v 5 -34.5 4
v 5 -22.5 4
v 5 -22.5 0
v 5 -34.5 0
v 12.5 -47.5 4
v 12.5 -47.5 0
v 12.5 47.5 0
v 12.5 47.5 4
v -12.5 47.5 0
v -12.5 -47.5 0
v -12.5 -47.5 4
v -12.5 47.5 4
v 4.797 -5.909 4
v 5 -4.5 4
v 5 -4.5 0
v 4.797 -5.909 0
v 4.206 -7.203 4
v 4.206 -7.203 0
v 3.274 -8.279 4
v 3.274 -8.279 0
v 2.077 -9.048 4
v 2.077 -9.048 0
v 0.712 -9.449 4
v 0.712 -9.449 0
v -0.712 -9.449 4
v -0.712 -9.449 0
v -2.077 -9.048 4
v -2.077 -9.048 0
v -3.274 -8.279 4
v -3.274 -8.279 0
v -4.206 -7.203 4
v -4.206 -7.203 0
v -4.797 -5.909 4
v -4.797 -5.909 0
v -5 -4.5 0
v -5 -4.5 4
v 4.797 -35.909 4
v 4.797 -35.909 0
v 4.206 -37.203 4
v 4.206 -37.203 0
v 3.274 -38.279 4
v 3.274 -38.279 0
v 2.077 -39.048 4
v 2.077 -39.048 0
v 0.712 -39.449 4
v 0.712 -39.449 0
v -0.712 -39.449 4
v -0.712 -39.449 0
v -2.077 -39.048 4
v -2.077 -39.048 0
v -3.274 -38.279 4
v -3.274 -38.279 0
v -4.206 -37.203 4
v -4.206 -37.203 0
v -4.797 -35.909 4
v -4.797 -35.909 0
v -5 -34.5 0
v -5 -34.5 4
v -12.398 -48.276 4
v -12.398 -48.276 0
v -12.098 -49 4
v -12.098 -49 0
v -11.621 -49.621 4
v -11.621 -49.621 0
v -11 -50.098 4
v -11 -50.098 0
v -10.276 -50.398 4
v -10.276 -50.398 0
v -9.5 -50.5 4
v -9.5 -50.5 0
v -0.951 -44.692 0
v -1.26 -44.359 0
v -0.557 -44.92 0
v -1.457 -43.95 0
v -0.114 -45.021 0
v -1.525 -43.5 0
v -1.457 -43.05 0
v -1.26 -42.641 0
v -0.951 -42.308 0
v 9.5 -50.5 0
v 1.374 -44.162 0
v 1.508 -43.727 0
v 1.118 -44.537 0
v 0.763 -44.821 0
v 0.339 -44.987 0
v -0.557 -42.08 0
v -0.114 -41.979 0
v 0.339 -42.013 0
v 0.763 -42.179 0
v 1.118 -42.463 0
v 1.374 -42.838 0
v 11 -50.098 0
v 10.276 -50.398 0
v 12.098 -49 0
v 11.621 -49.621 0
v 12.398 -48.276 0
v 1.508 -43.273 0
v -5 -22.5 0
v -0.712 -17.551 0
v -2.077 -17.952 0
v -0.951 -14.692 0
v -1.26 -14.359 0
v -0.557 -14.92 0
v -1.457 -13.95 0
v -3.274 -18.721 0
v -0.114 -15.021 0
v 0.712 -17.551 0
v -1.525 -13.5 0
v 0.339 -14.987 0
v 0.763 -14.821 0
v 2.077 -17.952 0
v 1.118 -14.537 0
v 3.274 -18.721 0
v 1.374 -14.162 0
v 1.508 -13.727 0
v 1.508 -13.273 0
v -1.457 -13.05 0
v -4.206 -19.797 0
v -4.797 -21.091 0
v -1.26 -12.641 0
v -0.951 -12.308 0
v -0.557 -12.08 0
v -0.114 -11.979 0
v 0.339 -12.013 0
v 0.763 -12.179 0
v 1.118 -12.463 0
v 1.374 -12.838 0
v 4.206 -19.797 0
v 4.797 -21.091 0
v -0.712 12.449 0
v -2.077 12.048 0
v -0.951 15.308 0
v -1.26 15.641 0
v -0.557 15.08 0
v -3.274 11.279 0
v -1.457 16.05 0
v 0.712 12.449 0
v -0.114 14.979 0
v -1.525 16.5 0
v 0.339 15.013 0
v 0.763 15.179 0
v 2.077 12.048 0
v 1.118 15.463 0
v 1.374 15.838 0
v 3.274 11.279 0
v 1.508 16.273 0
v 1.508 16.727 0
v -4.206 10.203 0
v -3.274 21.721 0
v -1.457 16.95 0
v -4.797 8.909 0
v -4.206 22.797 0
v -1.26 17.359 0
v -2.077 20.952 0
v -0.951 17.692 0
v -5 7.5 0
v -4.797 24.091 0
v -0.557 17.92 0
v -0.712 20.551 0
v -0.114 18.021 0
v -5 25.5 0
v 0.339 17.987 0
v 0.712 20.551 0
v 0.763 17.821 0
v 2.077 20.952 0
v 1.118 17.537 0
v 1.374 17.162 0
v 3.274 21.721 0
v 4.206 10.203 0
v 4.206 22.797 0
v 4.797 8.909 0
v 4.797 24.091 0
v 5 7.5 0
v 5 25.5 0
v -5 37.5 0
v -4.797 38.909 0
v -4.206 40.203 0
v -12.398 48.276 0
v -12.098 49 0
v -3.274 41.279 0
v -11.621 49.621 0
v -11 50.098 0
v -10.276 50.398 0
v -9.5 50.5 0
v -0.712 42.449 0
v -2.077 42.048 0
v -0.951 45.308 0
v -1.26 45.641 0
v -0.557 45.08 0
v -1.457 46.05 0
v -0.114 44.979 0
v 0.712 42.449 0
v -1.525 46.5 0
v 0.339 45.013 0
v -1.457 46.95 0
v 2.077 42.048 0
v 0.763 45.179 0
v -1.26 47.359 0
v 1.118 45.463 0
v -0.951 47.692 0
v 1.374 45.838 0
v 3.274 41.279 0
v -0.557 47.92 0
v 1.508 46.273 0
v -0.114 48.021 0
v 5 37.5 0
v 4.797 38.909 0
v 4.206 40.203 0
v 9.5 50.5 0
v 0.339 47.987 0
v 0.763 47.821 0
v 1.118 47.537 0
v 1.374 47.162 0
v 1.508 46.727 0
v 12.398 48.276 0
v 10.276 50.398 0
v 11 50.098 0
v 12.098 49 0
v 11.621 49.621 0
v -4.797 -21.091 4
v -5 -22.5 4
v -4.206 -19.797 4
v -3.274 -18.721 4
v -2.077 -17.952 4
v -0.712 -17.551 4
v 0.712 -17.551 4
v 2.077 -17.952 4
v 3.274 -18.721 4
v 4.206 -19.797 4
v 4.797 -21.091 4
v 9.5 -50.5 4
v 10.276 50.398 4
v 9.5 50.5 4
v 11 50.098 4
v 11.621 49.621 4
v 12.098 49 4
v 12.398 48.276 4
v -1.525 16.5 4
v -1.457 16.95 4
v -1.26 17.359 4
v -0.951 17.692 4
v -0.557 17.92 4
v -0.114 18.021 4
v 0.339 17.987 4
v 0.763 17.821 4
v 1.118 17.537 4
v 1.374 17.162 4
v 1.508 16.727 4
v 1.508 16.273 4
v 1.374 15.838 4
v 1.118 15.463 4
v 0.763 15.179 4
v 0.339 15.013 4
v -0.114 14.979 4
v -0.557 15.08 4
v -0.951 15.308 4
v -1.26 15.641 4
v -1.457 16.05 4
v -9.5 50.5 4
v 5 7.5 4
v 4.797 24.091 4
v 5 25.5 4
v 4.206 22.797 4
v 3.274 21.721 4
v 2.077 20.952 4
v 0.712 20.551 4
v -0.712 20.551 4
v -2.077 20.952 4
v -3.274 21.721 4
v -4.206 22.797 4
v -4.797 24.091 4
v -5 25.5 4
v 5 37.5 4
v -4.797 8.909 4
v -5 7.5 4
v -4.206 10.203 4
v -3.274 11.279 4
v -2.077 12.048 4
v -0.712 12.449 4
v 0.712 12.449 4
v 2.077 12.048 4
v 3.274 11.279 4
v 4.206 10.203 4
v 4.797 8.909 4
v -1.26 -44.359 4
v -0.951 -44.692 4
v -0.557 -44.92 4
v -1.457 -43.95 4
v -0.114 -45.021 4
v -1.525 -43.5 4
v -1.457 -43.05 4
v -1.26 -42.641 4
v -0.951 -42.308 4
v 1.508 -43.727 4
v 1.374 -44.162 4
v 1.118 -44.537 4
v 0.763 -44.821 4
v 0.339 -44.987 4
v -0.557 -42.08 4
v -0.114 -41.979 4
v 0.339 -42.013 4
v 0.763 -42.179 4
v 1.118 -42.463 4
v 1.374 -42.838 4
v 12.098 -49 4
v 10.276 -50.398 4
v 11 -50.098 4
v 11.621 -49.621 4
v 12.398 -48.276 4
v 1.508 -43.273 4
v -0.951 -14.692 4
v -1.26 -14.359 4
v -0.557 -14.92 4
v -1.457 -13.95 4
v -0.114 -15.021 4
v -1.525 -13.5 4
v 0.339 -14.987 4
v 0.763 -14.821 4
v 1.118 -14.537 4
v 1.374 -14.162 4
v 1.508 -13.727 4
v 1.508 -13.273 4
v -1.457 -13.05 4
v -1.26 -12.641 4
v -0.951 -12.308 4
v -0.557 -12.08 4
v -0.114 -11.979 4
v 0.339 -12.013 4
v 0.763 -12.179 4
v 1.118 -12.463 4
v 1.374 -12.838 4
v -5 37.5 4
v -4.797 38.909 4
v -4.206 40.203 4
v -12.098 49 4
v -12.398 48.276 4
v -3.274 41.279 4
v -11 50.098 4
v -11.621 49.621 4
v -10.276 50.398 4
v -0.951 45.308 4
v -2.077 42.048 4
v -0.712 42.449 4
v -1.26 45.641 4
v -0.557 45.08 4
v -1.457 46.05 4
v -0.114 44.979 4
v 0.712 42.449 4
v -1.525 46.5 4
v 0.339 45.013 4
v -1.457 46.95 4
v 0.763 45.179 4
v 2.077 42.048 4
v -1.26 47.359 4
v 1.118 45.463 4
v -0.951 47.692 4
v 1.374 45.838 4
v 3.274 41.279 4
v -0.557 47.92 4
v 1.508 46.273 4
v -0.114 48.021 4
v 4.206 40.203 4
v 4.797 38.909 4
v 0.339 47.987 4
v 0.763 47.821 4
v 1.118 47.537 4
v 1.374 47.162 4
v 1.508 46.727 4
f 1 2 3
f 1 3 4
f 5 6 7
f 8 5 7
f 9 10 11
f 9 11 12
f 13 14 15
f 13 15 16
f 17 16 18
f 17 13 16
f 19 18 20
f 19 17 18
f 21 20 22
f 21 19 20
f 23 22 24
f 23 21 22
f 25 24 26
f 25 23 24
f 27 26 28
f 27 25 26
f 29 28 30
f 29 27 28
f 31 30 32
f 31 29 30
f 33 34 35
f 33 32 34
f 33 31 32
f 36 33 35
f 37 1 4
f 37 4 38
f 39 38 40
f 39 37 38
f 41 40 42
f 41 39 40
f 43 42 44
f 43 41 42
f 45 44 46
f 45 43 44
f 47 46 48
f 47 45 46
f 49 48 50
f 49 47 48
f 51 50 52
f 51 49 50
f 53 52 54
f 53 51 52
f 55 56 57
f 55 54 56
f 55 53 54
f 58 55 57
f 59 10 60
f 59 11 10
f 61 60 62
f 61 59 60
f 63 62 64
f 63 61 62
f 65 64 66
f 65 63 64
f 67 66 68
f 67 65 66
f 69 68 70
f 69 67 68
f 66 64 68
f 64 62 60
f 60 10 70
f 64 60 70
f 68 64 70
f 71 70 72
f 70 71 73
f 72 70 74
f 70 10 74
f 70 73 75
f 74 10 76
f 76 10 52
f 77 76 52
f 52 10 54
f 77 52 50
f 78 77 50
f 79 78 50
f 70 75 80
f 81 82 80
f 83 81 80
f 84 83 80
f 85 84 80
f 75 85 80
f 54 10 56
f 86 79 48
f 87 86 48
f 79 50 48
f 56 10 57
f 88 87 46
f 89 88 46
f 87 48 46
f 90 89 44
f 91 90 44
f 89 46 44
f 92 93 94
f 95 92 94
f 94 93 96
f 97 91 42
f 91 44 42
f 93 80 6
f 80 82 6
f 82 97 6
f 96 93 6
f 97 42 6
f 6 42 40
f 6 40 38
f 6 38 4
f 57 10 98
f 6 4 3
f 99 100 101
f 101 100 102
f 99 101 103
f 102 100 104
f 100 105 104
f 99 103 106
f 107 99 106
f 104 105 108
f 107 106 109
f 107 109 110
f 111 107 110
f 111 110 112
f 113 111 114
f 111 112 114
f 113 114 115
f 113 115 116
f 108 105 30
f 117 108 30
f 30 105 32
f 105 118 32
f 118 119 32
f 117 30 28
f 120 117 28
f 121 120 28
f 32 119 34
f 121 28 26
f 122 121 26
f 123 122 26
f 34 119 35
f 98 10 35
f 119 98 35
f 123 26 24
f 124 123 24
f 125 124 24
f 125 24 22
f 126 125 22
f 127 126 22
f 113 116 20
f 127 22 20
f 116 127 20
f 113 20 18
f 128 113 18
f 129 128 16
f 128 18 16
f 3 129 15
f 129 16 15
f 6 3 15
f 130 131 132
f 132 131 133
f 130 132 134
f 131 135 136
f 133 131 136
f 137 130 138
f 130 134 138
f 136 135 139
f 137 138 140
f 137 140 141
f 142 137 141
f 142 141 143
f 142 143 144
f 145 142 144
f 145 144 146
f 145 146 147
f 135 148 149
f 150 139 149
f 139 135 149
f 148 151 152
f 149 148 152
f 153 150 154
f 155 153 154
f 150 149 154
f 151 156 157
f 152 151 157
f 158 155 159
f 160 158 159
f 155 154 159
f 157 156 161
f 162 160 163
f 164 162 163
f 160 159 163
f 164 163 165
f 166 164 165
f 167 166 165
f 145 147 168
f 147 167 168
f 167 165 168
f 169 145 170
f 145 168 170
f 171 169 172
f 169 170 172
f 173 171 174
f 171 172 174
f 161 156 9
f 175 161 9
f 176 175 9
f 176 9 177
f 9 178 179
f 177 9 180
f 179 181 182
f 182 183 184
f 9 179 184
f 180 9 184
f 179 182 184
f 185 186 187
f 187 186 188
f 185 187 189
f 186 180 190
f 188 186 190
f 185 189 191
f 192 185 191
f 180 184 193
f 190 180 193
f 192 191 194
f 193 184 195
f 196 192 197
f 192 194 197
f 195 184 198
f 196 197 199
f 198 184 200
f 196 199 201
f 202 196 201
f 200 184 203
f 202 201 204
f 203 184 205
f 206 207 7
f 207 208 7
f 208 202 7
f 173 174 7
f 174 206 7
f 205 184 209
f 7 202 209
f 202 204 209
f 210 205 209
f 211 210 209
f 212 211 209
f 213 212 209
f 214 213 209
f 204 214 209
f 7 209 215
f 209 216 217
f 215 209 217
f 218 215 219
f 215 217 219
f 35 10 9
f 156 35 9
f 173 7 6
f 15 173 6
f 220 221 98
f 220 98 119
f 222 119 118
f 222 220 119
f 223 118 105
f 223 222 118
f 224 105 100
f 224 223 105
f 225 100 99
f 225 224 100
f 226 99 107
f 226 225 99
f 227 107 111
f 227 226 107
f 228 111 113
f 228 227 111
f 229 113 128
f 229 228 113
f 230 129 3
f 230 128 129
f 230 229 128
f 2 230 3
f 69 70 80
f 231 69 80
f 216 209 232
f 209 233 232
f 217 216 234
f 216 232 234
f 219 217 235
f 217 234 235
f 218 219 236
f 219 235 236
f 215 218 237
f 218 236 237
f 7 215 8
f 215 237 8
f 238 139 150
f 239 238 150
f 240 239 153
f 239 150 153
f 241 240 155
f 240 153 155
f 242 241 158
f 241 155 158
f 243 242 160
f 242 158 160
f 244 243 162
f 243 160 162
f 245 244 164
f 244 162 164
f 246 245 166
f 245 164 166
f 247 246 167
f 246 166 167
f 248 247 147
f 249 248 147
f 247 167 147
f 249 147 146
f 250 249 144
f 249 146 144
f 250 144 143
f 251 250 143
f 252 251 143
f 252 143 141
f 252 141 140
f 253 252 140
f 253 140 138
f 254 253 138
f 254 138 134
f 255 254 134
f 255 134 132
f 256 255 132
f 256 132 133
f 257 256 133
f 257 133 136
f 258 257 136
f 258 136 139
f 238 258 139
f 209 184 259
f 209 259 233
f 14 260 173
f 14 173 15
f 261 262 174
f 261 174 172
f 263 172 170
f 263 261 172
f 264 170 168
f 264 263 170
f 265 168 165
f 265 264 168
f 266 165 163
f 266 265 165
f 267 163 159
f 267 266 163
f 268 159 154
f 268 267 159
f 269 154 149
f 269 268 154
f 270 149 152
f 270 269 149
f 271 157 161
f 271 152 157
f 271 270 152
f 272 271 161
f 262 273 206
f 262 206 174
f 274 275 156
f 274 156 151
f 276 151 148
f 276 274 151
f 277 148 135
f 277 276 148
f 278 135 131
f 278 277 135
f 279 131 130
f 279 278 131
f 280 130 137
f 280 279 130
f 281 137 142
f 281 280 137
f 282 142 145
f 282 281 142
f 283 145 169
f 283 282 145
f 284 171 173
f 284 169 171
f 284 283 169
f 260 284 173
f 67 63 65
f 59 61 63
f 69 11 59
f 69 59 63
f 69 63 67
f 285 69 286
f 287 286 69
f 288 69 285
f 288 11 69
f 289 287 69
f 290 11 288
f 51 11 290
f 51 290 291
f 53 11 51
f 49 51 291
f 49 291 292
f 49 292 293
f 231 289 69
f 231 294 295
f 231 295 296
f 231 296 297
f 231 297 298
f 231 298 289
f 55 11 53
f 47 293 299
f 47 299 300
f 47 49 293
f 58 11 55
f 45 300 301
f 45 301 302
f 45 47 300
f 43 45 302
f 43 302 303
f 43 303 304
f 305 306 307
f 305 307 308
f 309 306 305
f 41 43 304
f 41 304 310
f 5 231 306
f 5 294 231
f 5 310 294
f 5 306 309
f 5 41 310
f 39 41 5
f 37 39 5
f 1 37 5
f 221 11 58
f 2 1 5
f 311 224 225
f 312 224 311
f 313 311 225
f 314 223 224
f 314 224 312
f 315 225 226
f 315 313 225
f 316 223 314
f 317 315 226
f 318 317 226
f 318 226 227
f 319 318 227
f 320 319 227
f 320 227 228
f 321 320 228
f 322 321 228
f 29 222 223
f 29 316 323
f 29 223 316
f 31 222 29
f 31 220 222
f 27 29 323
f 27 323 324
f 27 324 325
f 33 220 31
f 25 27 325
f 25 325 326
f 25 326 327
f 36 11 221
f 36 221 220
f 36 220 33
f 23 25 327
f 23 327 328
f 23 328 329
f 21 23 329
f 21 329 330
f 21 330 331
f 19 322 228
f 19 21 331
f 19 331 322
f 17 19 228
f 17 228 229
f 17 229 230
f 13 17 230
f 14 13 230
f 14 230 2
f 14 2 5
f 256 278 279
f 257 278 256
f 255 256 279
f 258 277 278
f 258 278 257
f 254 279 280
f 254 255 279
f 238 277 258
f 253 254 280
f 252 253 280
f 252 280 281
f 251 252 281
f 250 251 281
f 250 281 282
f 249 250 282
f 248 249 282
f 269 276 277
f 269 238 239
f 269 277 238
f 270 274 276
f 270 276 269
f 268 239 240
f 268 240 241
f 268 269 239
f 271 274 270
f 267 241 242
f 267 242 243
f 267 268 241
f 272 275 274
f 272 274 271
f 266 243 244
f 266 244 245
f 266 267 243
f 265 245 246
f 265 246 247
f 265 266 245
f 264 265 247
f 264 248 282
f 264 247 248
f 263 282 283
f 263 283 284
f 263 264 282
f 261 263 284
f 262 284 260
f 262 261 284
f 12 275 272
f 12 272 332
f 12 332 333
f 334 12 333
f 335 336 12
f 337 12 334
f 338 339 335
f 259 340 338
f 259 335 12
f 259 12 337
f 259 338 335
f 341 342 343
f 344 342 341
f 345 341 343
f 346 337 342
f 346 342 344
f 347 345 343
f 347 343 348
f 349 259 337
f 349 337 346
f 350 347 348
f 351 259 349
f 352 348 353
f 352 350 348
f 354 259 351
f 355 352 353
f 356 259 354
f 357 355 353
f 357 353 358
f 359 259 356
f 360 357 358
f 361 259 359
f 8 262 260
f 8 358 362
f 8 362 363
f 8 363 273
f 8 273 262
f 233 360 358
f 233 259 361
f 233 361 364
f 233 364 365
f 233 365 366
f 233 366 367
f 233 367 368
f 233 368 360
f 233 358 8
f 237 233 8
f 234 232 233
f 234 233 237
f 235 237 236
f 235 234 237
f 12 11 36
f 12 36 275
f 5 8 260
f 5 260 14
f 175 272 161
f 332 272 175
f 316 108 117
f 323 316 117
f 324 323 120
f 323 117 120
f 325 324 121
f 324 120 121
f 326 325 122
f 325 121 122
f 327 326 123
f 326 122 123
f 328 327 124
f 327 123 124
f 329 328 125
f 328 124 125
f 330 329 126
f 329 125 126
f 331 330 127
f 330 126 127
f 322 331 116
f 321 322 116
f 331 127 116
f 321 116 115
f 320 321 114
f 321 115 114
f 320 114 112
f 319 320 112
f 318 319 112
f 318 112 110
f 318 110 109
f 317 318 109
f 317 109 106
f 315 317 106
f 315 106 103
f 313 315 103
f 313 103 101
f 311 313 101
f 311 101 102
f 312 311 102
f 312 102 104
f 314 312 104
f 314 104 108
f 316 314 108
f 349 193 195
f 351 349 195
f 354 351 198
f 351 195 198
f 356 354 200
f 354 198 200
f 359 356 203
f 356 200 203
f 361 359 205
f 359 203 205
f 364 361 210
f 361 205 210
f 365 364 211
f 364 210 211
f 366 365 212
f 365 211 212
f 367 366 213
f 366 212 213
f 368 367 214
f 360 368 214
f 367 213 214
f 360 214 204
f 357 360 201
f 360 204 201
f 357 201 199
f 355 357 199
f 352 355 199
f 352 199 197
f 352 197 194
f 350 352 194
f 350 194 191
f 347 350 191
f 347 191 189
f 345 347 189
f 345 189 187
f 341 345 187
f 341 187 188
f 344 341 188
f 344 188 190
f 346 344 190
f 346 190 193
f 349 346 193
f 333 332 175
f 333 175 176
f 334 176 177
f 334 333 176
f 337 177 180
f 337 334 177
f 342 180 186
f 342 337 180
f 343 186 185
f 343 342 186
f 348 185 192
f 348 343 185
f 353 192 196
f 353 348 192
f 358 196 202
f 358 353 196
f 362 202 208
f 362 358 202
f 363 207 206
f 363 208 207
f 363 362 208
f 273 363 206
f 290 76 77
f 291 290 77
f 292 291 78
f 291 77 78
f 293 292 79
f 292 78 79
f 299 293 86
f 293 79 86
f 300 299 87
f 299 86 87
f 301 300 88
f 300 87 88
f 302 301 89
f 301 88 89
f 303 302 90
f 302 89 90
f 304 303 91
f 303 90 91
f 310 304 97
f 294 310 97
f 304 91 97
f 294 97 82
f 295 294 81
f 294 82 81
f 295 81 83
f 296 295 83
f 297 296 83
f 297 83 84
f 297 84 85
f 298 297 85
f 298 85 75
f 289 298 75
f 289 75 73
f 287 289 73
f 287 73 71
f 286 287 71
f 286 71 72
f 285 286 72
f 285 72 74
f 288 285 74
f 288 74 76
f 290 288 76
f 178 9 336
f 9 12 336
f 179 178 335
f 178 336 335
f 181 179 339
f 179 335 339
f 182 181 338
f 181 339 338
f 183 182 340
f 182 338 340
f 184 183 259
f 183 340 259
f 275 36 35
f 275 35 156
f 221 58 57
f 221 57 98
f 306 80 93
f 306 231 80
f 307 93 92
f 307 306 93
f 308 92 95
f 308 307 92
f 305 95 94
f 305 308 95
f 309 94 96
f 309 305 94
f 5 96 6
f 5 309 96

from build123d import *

# Parameters (mm, degrees)
SKETCH_1_W               = 25
SKETCH_1_H               = 101
EXTRUDE_1_DEPTH          = 4
SKETCH_3_R               = 1.525
CUT_EXTRUDE_1_DEPTH      = 1
CUT_EXTRUDE_1_DEPTH_BACK = 5
FILLET_1_R               = 3
CUT_EXTRUDE_2_DEPTH      = 1
CUT_EXTRUDE_2_DEPTH_BACK = 5


with BuildPart() as part:
    # 草图1 → 凸台-拉伸1 (new body)
    with BuildSketch(Plane.XY):
        Rectangle(SKETCH_1_W, SKETCH_1_H)
    extrude(amount=EXTRUDE_1_DEPTH)

    # 草图3 → 切除-拉伸1 (cut, two sides)
    with BuildSketch(Plane(origin=(0, 0, 0), x_dir=(-1, 0, 0), z_dir=(0, 0, -1))) as cut_extrude_1_sk:
        with Locations((0, -43.500000001)):
            Circle(SKETCH_3_R)
        with Locations((0, -13.500000001)):
            Circle(SKETCH_3_R)
        with Locations((0, 16.499999999)):
            Circle(SKETCH_3_R)
        with Locations((0, 46.499999999)):
            Circle(SKETCH_3_R)
    extrude(amount=CUT_EXTRUDE_1_DEPTH, mode=Mode.SUBTRACT)
    extrude(cut_extrude_1_sk.sketch, amount=-CUT_EXTRUDE_1_DEPTH_BACK, mode=Mode.SUBTRACT)

    # 圆角1
    fillet_1_edges = [part.edges().sort_by_distance(p)[0] for p in [
        (12.5, -50.5, 2),
        (-12.5, -50.5, 2),
        (-12.5, 50.5, 2),
        (12.5, 50.5, 2),
    ]]
    fillet(fillet_1_edges, radius=FILLET_1_R)

    # 草图4 → 切除-拉伸2 (cut, two sides)
    with BuildSketch(Plane.XY.offset(4)) as cut_extrude_2_sk:
        with BuildLine():
            Line((-5, -34.500000001), (-5, -22.500000001))
            ThreePointArc((-5, -22.500000001), (0, -17.500000001), (5, -22.500000001))
            Line((5, -22.500000001), (5, -34.500000001))
            ThreePointArc((5, -34.500000001), (0, -39.500000001), (-5, -34.500000001))
        make_face()
        with BuildLine():
            Line((-5, -4.500000001), (-5, 7.499999999))
            ThreePointArc((-5, 7.499999999), (0, 12.499999999), (5, 7.499999999))
            Line((5, 7.499999999), (5, -4.500000001))
            ThreePointArc((5, -4.500000001), (0, -9.500000001), (-5, -4.500000001))
        make_face()
        with BuildLine():
            Line((-5, 25.499999999), (-5, 37.499999999))
            ThreePointArc((-5, 37.499999999), (0, 42.499999999), (5, 37.499999999))
            Line((5, 37.499999999), (5, 25.499999999))
            ThreePointArc((5, 25.499999999), (0, 20.499999999), (-5, 25.499999999))
        make_face()
    extrude(amount=CUT_EXTRUDE_2_DEPTH, mode=Mode.SUBTRACT)
    extrude(cut_extrude_2_sk.sketch, amount=-CUT_EXTRUDE_2_DEPTH_BACK, mode=Mode.SUBTRACT)


solid = part.part
